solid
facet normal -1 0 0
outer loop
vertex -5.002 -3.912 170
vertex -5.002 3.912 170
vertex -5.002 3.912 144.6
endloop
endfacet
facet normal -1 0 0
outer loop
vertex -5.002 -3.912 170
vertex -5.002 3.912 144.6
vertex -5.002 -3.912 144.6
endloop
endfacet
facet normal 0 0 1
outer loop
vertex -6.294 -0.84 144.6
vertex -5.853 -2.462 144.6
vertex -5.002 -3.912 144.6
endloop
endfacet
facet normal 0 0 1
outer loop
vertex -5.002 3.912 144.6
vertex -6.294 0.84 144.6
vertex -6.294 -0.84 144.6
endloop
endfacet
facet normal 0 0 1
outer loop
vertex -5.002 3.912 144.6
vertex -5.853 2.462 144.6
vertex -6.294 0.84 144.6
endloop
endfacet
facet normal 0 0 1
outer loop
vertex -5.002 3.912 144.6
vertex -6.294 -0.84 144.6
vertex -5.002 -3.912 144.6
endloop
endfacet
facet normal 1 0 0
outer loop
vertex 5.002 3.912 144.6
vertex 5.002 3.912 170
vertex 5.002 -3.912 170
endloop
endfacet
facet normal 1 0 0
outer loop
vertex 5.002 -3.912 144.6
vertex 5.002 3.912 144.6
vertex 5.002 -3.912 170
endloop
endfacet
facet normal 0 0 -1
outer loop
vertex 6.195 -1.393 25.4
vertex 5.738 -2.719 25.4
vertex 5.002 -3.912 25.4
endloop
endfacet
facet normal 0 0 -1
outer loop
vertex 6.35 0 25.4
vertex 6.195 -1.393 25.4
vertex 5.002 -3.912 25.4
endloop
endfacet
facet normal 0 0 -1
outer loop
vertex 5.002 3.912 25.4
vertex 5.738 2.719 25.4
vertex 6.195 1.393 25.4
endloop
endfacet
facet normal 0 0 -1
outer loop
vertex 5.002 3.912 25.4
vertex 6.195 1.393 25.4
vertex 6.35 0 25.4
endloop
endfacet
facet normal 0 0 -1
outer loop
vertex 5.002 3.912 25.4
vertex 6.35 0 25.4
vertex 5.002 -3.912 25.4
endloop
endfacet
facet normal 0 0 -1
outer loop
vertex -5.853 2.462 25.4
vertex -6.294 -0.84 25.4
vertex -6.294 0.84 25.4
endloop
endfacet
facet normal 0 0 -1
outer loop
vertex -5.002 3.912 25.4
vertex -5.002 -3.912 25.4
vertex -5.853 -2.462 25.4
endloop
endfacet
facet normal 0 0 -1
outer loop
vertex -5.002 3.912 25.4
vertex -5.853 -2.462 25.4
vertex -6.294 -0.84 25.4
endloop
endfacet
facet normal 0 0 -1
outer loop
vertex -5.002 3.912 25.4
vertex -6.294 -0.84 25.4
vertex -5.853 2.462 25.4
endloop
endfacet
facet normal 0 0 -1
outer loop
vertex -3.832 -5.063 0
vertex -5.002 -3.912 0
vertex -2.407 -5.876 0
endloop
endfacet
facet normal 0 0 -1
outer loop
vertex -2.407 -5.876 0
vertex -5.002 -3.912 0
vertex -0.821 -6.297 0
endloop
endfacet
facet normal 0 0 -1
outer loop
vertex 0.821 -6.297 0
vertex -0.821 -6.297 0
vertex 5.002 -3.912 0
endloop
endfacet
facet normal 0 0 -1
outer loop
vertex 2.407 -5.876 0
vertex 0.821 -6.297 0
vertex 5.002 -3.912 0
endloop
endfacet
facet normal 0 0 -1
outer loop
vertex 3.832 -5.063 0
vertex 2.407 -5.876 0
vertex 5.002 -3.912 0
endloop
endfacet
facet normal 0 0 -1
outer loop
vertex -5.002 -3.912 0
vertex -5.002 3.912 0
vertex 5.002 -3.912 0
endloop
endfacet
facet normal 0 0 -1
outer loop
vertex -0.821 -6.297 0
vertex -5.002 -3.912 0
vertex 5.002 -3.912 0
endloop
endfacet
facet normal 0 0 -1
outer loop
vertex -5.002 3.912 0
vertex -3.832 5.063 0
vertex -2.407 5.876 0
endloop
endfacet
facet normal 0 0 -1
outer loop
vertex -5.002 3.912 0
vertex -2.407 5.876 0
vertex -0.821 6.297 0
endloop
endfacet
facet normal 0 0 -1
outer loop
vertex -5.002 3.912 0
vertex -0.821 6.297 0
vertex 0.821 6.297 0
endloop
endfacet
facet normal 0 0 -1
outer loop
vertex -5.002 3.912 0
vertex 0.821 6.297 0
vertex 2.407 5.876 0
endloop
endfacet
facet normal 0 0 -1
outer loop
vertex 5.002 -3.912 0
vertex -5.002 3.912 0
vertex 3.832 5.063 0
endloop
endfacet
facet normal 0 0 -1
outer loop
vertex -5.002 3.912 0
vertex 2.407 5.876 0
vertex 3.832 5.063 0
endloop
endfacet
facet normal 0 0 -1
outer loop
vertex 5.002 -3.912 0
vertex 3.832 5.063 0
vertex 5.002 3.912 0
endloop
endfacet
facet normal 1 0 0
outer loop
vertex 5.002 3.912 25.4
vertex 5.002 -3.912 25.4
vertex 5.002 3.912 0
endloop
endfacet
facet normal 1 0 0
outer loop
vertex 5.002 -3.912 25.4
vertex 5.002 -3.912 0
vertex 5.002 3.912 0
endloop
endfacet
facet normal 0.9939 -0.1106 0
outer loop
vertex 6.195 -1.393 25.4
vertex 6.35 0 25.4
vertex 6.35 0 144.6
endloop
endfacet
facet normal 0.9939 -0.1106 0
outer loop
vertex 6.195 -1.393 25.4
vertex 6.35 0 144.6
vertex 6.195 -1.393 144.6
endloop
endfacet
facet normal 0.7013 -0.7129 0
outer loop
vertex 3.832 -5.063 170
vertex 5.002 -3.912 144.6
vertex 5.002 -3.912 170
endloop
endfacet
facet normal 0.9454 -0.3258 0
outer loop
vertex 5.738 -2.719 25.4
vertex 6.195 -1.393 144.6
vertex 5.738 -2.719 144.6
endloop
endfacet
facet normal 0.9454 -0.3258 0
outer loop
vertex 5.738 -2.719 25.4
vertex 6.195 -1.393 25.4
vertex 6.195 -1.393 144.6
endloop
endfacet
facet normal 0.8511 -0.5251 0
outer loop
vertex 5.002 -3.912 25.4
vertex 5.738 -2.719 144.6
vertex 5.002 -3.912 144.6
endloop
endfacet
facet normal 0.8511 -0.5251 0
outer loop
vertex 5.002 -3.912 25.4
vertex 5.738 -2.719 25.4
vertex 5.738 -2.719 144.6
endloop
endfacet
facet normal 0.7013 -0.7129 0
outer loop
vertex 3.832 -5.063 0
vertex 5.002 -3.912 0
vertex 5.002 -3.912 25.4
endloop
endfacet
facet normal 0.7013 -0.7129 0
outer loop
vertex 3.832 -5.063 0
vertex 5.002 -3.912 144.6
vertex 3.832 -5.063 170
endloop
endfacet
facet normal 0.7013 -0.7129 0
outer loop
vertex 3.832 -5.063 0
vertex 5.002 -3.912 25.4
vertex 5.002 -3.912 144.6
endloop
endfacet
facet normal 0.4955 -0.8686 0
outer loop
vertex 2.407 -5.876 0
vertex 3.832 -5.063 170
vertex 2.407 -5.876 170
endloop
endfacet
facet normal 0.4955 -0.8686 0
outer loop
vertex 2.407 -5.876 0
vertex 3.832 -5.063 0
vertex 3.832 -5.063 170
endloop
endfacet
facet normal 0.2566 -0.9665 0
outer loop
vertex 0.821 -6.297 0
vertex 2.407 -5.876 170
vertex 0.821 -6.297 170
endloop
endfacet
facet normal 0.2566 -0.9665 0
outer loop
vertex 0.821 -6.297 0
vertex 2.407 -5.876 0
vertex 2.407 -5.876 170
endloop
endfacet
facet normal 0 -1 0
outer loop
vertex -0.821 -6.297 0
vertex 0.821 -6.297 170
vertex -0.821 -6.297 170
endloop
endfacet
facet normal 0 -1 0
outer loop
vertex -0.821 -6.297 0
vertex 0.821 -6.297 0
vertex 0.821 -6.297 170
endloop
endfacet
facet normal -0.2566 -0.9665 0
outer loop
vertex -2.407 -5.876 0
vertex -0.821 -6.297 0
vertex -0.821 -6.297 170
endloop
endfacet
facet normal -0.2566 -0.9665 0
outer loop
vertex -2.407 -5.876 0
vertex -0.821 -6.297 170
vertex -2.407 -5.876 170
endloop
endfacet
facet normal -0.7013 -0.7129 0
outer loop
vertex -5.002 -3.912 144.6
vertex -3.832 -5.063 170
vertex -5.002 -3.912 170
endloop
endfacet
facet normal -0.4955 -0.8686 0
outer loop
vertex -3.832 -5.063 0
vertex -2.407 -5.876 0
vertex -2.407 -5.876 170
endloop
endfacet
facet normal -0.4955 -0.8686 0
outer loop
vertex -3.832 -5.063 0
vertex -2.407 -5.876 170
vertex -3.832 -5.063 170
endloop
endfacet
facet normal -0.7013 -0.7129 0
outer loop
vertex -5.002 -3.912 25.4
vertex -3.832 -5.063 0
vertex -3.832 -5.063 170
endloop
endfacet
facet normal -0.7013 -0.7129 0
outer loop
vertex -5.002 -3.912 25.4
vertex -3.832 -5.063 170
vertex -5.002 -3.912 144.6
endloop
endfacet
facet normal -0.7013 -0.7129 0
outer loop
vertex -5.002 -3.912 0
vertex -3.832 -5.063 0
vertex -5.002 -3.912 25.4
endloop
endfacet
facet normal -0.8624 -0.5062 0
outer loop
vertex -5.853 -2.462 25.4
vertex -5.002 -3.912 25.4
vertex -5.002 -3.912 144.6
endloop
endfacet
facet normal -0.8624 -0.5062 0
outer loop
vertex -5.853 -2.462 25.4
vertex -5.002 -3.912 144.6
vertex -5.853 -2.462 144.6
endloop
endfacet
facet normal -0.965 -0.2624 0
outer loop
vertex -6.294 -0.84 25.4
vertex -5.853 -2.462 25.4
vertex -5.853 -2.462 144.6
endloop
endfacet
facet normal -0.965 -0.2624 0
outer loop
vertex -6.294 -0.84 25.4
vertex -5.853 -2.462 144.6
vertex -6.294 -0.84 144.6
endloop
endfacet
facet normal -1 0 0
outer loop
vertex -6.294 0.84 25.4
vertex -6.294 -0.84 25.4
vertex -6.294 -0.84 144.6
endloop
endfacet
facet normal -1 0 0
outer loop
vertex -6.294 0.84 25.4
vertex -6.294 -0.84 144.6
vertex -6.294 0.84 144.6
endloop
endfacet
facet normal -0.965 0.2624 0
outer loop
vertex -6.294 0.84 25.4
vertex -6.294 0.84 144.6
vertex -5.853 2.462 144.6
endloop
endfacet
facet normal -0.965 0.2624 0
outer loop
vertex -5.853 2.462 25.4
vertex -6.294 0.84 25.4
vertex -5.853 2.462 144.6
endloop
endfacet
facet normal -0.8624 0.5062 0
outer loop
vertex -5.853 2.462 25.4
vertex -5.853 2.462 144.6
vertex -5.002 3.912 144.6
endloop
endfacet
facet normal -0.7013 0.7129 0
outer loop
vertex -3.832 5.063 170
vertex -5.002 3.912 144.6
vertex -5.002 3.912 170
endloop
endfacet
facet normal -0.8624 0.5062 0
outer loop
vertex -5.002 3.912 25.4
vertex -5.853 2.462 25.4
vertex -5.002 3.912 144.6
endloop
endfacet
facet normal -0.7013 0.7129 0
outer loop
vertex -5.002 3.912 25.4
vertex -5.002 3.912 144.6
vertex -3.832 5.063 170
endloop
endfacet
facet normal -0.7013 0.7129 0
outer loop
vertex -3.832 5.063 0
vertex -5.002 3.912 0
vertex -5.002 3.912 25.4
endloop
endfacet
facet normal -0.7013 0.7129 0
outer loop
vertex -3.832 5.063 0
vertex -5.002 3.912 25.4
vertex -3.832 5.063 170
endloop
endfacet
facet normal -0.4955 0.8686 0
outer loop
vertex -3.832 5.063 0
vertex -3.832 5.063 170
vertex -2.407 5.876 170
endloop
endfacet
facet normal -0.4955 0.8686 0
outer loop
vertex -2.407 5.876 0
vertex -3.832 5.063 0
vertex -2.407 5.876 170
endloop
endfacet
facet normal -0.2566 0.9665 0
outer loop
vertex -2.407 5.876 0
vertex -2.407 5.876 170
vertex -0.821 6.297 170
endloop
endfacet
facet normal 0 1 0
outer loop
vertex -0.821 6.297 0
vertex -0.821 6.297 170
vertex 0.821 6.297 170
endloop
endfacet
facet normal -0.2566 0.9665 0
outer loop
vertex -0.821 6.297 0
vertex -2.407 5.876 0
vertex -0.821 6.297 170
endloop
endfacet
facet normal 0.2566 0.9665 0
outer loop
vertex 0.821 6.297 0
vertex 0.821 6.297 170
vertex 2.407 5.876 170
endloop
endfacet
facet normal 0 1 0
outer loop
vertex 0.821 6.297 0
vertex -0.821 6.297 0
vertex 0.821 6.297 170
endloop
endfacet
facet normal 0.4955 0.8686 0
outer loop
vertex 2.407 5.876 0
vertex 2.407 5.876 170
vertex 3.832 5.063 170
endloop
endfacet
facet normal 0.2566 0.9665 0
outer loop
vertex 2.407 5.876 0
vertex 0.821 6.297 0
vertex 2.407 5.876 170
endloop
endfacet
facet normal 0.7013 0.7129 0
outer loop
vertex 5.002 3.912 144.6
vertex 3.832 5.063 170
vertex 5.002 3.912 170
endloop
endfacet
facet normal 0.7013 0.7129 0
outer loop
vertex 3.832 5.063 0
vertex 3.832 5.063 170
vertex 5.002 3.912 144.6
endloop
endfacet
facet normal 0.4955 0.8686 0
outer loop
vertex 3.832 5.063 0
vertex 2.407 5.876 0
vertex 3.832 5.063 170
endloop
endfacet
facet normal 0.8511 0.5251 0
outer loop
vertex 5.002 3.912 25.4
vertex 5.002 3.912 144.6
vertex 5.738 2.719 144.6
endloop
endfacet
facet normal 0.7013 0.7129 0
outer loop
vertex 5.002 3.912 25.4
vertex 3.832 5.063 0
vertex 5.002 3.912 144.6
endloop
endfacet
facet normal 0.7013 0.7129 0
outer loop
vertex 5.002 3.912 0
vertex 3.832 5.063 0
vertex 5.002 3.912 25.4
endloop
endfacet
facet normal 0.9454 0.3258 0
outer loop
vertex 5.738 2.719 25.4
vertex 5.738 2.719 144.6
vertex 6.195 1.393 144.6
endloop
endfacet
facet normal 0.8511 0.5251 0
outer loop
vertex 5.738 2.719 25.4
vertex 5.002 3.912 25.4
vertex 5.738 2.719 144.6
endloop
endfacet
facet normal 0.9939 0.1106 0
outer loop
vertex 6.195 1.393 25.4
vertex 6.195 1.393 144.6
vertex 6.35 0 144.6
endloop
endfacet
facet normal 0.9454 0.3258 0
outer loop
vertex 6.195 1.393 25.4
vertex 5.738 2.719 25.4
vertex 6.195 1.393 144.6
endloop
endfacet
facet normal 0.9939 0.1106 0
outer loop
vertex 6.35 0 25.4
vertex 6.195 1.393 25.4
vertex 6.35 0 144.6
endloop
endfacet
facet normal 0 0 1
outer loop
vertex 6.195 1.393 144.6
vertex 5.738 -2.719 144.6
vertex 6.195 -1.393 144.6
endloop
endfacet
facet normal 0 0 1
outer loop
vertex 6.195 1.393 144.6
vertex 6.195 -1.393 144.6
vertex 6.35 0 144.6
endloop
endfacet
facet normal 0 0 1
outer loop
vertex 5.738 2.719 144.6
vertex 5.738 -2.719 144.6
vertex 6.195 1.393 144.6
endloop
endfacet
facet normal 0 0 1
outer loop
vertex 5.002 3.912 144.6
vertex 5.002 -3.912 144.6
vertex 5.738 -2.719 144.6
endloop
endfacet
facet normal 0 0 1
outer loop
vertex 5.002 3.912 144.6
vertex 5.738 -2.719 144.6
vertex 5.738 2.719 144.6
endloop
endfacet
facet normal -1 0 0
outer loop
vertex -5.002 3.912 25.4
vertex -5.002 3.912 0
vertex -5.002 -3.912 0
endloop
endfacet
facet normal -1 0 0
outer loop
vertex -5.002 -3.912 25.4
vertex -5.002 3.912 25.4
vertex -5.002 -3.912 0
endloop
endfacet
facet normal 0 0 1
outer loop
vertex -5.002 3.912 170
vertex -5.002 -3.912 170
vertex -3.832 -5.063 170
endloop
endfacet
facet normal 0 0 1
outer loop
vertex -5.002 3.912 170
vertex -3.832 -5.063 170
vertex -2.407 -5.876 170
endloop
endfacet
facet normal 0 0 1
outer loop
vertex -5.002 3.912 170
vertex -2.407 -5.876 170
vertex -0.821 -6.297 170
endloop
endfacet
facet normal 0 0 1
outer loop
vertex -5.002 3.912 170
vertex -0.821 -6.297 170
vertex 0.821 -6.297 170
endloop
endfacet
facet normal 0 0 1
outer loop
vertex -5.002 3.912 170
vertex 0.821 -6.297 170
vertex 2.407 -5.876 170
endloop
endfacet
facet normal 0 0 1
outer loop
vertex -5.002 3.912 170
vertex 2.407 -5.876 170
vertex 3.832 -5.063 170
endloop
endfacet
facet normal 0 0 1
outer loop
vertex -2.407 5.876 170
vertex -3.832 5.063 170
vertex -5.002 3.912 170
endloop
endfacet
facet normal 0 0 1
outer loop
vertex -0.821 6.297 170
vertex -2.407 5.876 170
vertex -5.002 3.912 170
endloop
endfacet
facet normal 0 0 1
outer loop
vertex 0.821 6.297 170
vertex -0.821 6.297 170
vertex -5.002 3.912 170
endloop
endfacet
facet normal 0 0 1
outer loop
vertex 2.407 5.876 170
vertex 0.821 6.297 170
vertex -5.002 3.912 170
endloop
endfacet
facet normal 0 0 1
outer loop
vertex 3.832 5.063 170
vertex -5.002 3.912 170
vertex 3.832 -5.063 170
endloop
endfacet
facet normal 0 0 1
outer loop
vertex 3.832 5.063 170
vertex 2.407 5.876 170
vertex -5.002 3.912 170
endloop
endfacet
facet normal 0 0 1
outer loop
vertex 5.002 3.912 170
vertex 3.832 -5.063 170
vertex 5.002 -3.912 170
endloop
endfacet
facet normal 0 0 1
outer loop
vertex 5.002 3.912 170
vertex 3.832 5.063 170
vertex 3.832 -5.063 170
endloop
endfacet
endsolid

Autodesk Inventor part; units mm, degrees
ref_plane "YZ Plane" through (0, 0, 0) normal (1, 0, 0) x (0, 1, 0)
ref_plane "XZ Plane" through (0, 0, 0) normal (0, 1, 0) x (-1, 0, 0)
ref_plane "XY Plane" through (0, 0, 0) normal (0, 0, 1) x (1, 0, 0)
sketch "Sketch1" plane through (0, 0, 0) normal (0, 0, 1) x (1, 0, 0)
  circle A0 centre (0, 0) radius 6.35
  dimension "d0" = 12.7
extrude "Extrusion1" add sketch "Sketch1" along normal blind 170
sketch "Sketch2" plane through (0, 0, 170) normal (0, 0, 1) x (1, 0, 0)
  circle A0 centre (0, 0) radius 6.35 projected
  line L0 (-5, 3.9144) -> (5, 3.9144) construction
  line L1 (-5, 3.9144) -> (5, 3.9144) construction
  line L2 (-5, -3.9144) -> (5, -3.9144) construction
  line L3 (-5, -3.9144) -> (5, -3.9144) construction
  circle A1 centre (0, 0) radius 6.35 projected
  dimension "d3" = 10
  dimension "d4" = 0
  dimension "d5" = 10
  dimension "d6" = 0
thread "Thread1" size "1/2-13 UNC" class "2A" standard "ANSI Unified Screw Threads" length 25.4
thread "Thread2" size "1/2-13 UNC" class "2A" standard "ANSI Unified Screw Threads" length 25.4
sketch "Sketch3" plane through (0, 0, 170) normal (0, 0, 1) x (1, 0, 0)
  circle A0 centre (0, 0) radius 6.35 projected
  line L0 (5.0019, 3.912) -> (5.0019, -3.912)
  arc A1 (5.0019, -3.912) -> (5.0019, 3.912) centre (0, 0) ccw
extrude "Extrusion2" cut sketch "Sketch3" against normal blind 25.4 contours A0 L0 picked at (5.2474, -0.9063)
sketch "Sketch4" plane through (0, 0, 170) normal (0, 0, 1) x (1, 0, 0)
  arc A0 (5.0019, 3.912) -> (5.0019, -3.912) centre (0, 0) ccw projected
  line L0 (-5.0019, 3.912) -> (-5.0019, -3.912)
  arc A1 (-5.0019, 3.912) -> (-5.0019, -3.912) centre (0, 0) ccw
extrude "Extrusion3" cut sketch "Sketch4" against normal blind 25.4
sketch "Sketch5" plane through (0, 0, 0) normal (0, 0, -1) x (-1, 0, 0)
  line L0 (-5.0019, -3.912) -> (-5.0019, 3.912) projected
  line L1 (-5.0019, 3.912) -> (-5.0019, -3.912)
  arc A0 (-5.0019, 3.912) -> (-5.0019, -3.912) centre (0, 0) ccw
extrude "Extrusion4" cut sketch "Sketch5" against normal blind 25.4
sketch "Sketch6" plane through (0, 0, 0) normal (0, 0, -1) x (-1, 0, 0)
  arc A0 (5.0019, -3.912) -> (5.0019, 3.912) centre (0, 0) ccw projected
  line L0 (5.0019, 3.912) -> (5.0019, -3.912)
  arc A1 (5.0019, -3.912) -> (5.0019, 3.912) centre (0, 0) ccw
extrude "Extrusion5" cut sketch "Sketch6" against normal blind 25.4
properties part number "Rear Axle2"
